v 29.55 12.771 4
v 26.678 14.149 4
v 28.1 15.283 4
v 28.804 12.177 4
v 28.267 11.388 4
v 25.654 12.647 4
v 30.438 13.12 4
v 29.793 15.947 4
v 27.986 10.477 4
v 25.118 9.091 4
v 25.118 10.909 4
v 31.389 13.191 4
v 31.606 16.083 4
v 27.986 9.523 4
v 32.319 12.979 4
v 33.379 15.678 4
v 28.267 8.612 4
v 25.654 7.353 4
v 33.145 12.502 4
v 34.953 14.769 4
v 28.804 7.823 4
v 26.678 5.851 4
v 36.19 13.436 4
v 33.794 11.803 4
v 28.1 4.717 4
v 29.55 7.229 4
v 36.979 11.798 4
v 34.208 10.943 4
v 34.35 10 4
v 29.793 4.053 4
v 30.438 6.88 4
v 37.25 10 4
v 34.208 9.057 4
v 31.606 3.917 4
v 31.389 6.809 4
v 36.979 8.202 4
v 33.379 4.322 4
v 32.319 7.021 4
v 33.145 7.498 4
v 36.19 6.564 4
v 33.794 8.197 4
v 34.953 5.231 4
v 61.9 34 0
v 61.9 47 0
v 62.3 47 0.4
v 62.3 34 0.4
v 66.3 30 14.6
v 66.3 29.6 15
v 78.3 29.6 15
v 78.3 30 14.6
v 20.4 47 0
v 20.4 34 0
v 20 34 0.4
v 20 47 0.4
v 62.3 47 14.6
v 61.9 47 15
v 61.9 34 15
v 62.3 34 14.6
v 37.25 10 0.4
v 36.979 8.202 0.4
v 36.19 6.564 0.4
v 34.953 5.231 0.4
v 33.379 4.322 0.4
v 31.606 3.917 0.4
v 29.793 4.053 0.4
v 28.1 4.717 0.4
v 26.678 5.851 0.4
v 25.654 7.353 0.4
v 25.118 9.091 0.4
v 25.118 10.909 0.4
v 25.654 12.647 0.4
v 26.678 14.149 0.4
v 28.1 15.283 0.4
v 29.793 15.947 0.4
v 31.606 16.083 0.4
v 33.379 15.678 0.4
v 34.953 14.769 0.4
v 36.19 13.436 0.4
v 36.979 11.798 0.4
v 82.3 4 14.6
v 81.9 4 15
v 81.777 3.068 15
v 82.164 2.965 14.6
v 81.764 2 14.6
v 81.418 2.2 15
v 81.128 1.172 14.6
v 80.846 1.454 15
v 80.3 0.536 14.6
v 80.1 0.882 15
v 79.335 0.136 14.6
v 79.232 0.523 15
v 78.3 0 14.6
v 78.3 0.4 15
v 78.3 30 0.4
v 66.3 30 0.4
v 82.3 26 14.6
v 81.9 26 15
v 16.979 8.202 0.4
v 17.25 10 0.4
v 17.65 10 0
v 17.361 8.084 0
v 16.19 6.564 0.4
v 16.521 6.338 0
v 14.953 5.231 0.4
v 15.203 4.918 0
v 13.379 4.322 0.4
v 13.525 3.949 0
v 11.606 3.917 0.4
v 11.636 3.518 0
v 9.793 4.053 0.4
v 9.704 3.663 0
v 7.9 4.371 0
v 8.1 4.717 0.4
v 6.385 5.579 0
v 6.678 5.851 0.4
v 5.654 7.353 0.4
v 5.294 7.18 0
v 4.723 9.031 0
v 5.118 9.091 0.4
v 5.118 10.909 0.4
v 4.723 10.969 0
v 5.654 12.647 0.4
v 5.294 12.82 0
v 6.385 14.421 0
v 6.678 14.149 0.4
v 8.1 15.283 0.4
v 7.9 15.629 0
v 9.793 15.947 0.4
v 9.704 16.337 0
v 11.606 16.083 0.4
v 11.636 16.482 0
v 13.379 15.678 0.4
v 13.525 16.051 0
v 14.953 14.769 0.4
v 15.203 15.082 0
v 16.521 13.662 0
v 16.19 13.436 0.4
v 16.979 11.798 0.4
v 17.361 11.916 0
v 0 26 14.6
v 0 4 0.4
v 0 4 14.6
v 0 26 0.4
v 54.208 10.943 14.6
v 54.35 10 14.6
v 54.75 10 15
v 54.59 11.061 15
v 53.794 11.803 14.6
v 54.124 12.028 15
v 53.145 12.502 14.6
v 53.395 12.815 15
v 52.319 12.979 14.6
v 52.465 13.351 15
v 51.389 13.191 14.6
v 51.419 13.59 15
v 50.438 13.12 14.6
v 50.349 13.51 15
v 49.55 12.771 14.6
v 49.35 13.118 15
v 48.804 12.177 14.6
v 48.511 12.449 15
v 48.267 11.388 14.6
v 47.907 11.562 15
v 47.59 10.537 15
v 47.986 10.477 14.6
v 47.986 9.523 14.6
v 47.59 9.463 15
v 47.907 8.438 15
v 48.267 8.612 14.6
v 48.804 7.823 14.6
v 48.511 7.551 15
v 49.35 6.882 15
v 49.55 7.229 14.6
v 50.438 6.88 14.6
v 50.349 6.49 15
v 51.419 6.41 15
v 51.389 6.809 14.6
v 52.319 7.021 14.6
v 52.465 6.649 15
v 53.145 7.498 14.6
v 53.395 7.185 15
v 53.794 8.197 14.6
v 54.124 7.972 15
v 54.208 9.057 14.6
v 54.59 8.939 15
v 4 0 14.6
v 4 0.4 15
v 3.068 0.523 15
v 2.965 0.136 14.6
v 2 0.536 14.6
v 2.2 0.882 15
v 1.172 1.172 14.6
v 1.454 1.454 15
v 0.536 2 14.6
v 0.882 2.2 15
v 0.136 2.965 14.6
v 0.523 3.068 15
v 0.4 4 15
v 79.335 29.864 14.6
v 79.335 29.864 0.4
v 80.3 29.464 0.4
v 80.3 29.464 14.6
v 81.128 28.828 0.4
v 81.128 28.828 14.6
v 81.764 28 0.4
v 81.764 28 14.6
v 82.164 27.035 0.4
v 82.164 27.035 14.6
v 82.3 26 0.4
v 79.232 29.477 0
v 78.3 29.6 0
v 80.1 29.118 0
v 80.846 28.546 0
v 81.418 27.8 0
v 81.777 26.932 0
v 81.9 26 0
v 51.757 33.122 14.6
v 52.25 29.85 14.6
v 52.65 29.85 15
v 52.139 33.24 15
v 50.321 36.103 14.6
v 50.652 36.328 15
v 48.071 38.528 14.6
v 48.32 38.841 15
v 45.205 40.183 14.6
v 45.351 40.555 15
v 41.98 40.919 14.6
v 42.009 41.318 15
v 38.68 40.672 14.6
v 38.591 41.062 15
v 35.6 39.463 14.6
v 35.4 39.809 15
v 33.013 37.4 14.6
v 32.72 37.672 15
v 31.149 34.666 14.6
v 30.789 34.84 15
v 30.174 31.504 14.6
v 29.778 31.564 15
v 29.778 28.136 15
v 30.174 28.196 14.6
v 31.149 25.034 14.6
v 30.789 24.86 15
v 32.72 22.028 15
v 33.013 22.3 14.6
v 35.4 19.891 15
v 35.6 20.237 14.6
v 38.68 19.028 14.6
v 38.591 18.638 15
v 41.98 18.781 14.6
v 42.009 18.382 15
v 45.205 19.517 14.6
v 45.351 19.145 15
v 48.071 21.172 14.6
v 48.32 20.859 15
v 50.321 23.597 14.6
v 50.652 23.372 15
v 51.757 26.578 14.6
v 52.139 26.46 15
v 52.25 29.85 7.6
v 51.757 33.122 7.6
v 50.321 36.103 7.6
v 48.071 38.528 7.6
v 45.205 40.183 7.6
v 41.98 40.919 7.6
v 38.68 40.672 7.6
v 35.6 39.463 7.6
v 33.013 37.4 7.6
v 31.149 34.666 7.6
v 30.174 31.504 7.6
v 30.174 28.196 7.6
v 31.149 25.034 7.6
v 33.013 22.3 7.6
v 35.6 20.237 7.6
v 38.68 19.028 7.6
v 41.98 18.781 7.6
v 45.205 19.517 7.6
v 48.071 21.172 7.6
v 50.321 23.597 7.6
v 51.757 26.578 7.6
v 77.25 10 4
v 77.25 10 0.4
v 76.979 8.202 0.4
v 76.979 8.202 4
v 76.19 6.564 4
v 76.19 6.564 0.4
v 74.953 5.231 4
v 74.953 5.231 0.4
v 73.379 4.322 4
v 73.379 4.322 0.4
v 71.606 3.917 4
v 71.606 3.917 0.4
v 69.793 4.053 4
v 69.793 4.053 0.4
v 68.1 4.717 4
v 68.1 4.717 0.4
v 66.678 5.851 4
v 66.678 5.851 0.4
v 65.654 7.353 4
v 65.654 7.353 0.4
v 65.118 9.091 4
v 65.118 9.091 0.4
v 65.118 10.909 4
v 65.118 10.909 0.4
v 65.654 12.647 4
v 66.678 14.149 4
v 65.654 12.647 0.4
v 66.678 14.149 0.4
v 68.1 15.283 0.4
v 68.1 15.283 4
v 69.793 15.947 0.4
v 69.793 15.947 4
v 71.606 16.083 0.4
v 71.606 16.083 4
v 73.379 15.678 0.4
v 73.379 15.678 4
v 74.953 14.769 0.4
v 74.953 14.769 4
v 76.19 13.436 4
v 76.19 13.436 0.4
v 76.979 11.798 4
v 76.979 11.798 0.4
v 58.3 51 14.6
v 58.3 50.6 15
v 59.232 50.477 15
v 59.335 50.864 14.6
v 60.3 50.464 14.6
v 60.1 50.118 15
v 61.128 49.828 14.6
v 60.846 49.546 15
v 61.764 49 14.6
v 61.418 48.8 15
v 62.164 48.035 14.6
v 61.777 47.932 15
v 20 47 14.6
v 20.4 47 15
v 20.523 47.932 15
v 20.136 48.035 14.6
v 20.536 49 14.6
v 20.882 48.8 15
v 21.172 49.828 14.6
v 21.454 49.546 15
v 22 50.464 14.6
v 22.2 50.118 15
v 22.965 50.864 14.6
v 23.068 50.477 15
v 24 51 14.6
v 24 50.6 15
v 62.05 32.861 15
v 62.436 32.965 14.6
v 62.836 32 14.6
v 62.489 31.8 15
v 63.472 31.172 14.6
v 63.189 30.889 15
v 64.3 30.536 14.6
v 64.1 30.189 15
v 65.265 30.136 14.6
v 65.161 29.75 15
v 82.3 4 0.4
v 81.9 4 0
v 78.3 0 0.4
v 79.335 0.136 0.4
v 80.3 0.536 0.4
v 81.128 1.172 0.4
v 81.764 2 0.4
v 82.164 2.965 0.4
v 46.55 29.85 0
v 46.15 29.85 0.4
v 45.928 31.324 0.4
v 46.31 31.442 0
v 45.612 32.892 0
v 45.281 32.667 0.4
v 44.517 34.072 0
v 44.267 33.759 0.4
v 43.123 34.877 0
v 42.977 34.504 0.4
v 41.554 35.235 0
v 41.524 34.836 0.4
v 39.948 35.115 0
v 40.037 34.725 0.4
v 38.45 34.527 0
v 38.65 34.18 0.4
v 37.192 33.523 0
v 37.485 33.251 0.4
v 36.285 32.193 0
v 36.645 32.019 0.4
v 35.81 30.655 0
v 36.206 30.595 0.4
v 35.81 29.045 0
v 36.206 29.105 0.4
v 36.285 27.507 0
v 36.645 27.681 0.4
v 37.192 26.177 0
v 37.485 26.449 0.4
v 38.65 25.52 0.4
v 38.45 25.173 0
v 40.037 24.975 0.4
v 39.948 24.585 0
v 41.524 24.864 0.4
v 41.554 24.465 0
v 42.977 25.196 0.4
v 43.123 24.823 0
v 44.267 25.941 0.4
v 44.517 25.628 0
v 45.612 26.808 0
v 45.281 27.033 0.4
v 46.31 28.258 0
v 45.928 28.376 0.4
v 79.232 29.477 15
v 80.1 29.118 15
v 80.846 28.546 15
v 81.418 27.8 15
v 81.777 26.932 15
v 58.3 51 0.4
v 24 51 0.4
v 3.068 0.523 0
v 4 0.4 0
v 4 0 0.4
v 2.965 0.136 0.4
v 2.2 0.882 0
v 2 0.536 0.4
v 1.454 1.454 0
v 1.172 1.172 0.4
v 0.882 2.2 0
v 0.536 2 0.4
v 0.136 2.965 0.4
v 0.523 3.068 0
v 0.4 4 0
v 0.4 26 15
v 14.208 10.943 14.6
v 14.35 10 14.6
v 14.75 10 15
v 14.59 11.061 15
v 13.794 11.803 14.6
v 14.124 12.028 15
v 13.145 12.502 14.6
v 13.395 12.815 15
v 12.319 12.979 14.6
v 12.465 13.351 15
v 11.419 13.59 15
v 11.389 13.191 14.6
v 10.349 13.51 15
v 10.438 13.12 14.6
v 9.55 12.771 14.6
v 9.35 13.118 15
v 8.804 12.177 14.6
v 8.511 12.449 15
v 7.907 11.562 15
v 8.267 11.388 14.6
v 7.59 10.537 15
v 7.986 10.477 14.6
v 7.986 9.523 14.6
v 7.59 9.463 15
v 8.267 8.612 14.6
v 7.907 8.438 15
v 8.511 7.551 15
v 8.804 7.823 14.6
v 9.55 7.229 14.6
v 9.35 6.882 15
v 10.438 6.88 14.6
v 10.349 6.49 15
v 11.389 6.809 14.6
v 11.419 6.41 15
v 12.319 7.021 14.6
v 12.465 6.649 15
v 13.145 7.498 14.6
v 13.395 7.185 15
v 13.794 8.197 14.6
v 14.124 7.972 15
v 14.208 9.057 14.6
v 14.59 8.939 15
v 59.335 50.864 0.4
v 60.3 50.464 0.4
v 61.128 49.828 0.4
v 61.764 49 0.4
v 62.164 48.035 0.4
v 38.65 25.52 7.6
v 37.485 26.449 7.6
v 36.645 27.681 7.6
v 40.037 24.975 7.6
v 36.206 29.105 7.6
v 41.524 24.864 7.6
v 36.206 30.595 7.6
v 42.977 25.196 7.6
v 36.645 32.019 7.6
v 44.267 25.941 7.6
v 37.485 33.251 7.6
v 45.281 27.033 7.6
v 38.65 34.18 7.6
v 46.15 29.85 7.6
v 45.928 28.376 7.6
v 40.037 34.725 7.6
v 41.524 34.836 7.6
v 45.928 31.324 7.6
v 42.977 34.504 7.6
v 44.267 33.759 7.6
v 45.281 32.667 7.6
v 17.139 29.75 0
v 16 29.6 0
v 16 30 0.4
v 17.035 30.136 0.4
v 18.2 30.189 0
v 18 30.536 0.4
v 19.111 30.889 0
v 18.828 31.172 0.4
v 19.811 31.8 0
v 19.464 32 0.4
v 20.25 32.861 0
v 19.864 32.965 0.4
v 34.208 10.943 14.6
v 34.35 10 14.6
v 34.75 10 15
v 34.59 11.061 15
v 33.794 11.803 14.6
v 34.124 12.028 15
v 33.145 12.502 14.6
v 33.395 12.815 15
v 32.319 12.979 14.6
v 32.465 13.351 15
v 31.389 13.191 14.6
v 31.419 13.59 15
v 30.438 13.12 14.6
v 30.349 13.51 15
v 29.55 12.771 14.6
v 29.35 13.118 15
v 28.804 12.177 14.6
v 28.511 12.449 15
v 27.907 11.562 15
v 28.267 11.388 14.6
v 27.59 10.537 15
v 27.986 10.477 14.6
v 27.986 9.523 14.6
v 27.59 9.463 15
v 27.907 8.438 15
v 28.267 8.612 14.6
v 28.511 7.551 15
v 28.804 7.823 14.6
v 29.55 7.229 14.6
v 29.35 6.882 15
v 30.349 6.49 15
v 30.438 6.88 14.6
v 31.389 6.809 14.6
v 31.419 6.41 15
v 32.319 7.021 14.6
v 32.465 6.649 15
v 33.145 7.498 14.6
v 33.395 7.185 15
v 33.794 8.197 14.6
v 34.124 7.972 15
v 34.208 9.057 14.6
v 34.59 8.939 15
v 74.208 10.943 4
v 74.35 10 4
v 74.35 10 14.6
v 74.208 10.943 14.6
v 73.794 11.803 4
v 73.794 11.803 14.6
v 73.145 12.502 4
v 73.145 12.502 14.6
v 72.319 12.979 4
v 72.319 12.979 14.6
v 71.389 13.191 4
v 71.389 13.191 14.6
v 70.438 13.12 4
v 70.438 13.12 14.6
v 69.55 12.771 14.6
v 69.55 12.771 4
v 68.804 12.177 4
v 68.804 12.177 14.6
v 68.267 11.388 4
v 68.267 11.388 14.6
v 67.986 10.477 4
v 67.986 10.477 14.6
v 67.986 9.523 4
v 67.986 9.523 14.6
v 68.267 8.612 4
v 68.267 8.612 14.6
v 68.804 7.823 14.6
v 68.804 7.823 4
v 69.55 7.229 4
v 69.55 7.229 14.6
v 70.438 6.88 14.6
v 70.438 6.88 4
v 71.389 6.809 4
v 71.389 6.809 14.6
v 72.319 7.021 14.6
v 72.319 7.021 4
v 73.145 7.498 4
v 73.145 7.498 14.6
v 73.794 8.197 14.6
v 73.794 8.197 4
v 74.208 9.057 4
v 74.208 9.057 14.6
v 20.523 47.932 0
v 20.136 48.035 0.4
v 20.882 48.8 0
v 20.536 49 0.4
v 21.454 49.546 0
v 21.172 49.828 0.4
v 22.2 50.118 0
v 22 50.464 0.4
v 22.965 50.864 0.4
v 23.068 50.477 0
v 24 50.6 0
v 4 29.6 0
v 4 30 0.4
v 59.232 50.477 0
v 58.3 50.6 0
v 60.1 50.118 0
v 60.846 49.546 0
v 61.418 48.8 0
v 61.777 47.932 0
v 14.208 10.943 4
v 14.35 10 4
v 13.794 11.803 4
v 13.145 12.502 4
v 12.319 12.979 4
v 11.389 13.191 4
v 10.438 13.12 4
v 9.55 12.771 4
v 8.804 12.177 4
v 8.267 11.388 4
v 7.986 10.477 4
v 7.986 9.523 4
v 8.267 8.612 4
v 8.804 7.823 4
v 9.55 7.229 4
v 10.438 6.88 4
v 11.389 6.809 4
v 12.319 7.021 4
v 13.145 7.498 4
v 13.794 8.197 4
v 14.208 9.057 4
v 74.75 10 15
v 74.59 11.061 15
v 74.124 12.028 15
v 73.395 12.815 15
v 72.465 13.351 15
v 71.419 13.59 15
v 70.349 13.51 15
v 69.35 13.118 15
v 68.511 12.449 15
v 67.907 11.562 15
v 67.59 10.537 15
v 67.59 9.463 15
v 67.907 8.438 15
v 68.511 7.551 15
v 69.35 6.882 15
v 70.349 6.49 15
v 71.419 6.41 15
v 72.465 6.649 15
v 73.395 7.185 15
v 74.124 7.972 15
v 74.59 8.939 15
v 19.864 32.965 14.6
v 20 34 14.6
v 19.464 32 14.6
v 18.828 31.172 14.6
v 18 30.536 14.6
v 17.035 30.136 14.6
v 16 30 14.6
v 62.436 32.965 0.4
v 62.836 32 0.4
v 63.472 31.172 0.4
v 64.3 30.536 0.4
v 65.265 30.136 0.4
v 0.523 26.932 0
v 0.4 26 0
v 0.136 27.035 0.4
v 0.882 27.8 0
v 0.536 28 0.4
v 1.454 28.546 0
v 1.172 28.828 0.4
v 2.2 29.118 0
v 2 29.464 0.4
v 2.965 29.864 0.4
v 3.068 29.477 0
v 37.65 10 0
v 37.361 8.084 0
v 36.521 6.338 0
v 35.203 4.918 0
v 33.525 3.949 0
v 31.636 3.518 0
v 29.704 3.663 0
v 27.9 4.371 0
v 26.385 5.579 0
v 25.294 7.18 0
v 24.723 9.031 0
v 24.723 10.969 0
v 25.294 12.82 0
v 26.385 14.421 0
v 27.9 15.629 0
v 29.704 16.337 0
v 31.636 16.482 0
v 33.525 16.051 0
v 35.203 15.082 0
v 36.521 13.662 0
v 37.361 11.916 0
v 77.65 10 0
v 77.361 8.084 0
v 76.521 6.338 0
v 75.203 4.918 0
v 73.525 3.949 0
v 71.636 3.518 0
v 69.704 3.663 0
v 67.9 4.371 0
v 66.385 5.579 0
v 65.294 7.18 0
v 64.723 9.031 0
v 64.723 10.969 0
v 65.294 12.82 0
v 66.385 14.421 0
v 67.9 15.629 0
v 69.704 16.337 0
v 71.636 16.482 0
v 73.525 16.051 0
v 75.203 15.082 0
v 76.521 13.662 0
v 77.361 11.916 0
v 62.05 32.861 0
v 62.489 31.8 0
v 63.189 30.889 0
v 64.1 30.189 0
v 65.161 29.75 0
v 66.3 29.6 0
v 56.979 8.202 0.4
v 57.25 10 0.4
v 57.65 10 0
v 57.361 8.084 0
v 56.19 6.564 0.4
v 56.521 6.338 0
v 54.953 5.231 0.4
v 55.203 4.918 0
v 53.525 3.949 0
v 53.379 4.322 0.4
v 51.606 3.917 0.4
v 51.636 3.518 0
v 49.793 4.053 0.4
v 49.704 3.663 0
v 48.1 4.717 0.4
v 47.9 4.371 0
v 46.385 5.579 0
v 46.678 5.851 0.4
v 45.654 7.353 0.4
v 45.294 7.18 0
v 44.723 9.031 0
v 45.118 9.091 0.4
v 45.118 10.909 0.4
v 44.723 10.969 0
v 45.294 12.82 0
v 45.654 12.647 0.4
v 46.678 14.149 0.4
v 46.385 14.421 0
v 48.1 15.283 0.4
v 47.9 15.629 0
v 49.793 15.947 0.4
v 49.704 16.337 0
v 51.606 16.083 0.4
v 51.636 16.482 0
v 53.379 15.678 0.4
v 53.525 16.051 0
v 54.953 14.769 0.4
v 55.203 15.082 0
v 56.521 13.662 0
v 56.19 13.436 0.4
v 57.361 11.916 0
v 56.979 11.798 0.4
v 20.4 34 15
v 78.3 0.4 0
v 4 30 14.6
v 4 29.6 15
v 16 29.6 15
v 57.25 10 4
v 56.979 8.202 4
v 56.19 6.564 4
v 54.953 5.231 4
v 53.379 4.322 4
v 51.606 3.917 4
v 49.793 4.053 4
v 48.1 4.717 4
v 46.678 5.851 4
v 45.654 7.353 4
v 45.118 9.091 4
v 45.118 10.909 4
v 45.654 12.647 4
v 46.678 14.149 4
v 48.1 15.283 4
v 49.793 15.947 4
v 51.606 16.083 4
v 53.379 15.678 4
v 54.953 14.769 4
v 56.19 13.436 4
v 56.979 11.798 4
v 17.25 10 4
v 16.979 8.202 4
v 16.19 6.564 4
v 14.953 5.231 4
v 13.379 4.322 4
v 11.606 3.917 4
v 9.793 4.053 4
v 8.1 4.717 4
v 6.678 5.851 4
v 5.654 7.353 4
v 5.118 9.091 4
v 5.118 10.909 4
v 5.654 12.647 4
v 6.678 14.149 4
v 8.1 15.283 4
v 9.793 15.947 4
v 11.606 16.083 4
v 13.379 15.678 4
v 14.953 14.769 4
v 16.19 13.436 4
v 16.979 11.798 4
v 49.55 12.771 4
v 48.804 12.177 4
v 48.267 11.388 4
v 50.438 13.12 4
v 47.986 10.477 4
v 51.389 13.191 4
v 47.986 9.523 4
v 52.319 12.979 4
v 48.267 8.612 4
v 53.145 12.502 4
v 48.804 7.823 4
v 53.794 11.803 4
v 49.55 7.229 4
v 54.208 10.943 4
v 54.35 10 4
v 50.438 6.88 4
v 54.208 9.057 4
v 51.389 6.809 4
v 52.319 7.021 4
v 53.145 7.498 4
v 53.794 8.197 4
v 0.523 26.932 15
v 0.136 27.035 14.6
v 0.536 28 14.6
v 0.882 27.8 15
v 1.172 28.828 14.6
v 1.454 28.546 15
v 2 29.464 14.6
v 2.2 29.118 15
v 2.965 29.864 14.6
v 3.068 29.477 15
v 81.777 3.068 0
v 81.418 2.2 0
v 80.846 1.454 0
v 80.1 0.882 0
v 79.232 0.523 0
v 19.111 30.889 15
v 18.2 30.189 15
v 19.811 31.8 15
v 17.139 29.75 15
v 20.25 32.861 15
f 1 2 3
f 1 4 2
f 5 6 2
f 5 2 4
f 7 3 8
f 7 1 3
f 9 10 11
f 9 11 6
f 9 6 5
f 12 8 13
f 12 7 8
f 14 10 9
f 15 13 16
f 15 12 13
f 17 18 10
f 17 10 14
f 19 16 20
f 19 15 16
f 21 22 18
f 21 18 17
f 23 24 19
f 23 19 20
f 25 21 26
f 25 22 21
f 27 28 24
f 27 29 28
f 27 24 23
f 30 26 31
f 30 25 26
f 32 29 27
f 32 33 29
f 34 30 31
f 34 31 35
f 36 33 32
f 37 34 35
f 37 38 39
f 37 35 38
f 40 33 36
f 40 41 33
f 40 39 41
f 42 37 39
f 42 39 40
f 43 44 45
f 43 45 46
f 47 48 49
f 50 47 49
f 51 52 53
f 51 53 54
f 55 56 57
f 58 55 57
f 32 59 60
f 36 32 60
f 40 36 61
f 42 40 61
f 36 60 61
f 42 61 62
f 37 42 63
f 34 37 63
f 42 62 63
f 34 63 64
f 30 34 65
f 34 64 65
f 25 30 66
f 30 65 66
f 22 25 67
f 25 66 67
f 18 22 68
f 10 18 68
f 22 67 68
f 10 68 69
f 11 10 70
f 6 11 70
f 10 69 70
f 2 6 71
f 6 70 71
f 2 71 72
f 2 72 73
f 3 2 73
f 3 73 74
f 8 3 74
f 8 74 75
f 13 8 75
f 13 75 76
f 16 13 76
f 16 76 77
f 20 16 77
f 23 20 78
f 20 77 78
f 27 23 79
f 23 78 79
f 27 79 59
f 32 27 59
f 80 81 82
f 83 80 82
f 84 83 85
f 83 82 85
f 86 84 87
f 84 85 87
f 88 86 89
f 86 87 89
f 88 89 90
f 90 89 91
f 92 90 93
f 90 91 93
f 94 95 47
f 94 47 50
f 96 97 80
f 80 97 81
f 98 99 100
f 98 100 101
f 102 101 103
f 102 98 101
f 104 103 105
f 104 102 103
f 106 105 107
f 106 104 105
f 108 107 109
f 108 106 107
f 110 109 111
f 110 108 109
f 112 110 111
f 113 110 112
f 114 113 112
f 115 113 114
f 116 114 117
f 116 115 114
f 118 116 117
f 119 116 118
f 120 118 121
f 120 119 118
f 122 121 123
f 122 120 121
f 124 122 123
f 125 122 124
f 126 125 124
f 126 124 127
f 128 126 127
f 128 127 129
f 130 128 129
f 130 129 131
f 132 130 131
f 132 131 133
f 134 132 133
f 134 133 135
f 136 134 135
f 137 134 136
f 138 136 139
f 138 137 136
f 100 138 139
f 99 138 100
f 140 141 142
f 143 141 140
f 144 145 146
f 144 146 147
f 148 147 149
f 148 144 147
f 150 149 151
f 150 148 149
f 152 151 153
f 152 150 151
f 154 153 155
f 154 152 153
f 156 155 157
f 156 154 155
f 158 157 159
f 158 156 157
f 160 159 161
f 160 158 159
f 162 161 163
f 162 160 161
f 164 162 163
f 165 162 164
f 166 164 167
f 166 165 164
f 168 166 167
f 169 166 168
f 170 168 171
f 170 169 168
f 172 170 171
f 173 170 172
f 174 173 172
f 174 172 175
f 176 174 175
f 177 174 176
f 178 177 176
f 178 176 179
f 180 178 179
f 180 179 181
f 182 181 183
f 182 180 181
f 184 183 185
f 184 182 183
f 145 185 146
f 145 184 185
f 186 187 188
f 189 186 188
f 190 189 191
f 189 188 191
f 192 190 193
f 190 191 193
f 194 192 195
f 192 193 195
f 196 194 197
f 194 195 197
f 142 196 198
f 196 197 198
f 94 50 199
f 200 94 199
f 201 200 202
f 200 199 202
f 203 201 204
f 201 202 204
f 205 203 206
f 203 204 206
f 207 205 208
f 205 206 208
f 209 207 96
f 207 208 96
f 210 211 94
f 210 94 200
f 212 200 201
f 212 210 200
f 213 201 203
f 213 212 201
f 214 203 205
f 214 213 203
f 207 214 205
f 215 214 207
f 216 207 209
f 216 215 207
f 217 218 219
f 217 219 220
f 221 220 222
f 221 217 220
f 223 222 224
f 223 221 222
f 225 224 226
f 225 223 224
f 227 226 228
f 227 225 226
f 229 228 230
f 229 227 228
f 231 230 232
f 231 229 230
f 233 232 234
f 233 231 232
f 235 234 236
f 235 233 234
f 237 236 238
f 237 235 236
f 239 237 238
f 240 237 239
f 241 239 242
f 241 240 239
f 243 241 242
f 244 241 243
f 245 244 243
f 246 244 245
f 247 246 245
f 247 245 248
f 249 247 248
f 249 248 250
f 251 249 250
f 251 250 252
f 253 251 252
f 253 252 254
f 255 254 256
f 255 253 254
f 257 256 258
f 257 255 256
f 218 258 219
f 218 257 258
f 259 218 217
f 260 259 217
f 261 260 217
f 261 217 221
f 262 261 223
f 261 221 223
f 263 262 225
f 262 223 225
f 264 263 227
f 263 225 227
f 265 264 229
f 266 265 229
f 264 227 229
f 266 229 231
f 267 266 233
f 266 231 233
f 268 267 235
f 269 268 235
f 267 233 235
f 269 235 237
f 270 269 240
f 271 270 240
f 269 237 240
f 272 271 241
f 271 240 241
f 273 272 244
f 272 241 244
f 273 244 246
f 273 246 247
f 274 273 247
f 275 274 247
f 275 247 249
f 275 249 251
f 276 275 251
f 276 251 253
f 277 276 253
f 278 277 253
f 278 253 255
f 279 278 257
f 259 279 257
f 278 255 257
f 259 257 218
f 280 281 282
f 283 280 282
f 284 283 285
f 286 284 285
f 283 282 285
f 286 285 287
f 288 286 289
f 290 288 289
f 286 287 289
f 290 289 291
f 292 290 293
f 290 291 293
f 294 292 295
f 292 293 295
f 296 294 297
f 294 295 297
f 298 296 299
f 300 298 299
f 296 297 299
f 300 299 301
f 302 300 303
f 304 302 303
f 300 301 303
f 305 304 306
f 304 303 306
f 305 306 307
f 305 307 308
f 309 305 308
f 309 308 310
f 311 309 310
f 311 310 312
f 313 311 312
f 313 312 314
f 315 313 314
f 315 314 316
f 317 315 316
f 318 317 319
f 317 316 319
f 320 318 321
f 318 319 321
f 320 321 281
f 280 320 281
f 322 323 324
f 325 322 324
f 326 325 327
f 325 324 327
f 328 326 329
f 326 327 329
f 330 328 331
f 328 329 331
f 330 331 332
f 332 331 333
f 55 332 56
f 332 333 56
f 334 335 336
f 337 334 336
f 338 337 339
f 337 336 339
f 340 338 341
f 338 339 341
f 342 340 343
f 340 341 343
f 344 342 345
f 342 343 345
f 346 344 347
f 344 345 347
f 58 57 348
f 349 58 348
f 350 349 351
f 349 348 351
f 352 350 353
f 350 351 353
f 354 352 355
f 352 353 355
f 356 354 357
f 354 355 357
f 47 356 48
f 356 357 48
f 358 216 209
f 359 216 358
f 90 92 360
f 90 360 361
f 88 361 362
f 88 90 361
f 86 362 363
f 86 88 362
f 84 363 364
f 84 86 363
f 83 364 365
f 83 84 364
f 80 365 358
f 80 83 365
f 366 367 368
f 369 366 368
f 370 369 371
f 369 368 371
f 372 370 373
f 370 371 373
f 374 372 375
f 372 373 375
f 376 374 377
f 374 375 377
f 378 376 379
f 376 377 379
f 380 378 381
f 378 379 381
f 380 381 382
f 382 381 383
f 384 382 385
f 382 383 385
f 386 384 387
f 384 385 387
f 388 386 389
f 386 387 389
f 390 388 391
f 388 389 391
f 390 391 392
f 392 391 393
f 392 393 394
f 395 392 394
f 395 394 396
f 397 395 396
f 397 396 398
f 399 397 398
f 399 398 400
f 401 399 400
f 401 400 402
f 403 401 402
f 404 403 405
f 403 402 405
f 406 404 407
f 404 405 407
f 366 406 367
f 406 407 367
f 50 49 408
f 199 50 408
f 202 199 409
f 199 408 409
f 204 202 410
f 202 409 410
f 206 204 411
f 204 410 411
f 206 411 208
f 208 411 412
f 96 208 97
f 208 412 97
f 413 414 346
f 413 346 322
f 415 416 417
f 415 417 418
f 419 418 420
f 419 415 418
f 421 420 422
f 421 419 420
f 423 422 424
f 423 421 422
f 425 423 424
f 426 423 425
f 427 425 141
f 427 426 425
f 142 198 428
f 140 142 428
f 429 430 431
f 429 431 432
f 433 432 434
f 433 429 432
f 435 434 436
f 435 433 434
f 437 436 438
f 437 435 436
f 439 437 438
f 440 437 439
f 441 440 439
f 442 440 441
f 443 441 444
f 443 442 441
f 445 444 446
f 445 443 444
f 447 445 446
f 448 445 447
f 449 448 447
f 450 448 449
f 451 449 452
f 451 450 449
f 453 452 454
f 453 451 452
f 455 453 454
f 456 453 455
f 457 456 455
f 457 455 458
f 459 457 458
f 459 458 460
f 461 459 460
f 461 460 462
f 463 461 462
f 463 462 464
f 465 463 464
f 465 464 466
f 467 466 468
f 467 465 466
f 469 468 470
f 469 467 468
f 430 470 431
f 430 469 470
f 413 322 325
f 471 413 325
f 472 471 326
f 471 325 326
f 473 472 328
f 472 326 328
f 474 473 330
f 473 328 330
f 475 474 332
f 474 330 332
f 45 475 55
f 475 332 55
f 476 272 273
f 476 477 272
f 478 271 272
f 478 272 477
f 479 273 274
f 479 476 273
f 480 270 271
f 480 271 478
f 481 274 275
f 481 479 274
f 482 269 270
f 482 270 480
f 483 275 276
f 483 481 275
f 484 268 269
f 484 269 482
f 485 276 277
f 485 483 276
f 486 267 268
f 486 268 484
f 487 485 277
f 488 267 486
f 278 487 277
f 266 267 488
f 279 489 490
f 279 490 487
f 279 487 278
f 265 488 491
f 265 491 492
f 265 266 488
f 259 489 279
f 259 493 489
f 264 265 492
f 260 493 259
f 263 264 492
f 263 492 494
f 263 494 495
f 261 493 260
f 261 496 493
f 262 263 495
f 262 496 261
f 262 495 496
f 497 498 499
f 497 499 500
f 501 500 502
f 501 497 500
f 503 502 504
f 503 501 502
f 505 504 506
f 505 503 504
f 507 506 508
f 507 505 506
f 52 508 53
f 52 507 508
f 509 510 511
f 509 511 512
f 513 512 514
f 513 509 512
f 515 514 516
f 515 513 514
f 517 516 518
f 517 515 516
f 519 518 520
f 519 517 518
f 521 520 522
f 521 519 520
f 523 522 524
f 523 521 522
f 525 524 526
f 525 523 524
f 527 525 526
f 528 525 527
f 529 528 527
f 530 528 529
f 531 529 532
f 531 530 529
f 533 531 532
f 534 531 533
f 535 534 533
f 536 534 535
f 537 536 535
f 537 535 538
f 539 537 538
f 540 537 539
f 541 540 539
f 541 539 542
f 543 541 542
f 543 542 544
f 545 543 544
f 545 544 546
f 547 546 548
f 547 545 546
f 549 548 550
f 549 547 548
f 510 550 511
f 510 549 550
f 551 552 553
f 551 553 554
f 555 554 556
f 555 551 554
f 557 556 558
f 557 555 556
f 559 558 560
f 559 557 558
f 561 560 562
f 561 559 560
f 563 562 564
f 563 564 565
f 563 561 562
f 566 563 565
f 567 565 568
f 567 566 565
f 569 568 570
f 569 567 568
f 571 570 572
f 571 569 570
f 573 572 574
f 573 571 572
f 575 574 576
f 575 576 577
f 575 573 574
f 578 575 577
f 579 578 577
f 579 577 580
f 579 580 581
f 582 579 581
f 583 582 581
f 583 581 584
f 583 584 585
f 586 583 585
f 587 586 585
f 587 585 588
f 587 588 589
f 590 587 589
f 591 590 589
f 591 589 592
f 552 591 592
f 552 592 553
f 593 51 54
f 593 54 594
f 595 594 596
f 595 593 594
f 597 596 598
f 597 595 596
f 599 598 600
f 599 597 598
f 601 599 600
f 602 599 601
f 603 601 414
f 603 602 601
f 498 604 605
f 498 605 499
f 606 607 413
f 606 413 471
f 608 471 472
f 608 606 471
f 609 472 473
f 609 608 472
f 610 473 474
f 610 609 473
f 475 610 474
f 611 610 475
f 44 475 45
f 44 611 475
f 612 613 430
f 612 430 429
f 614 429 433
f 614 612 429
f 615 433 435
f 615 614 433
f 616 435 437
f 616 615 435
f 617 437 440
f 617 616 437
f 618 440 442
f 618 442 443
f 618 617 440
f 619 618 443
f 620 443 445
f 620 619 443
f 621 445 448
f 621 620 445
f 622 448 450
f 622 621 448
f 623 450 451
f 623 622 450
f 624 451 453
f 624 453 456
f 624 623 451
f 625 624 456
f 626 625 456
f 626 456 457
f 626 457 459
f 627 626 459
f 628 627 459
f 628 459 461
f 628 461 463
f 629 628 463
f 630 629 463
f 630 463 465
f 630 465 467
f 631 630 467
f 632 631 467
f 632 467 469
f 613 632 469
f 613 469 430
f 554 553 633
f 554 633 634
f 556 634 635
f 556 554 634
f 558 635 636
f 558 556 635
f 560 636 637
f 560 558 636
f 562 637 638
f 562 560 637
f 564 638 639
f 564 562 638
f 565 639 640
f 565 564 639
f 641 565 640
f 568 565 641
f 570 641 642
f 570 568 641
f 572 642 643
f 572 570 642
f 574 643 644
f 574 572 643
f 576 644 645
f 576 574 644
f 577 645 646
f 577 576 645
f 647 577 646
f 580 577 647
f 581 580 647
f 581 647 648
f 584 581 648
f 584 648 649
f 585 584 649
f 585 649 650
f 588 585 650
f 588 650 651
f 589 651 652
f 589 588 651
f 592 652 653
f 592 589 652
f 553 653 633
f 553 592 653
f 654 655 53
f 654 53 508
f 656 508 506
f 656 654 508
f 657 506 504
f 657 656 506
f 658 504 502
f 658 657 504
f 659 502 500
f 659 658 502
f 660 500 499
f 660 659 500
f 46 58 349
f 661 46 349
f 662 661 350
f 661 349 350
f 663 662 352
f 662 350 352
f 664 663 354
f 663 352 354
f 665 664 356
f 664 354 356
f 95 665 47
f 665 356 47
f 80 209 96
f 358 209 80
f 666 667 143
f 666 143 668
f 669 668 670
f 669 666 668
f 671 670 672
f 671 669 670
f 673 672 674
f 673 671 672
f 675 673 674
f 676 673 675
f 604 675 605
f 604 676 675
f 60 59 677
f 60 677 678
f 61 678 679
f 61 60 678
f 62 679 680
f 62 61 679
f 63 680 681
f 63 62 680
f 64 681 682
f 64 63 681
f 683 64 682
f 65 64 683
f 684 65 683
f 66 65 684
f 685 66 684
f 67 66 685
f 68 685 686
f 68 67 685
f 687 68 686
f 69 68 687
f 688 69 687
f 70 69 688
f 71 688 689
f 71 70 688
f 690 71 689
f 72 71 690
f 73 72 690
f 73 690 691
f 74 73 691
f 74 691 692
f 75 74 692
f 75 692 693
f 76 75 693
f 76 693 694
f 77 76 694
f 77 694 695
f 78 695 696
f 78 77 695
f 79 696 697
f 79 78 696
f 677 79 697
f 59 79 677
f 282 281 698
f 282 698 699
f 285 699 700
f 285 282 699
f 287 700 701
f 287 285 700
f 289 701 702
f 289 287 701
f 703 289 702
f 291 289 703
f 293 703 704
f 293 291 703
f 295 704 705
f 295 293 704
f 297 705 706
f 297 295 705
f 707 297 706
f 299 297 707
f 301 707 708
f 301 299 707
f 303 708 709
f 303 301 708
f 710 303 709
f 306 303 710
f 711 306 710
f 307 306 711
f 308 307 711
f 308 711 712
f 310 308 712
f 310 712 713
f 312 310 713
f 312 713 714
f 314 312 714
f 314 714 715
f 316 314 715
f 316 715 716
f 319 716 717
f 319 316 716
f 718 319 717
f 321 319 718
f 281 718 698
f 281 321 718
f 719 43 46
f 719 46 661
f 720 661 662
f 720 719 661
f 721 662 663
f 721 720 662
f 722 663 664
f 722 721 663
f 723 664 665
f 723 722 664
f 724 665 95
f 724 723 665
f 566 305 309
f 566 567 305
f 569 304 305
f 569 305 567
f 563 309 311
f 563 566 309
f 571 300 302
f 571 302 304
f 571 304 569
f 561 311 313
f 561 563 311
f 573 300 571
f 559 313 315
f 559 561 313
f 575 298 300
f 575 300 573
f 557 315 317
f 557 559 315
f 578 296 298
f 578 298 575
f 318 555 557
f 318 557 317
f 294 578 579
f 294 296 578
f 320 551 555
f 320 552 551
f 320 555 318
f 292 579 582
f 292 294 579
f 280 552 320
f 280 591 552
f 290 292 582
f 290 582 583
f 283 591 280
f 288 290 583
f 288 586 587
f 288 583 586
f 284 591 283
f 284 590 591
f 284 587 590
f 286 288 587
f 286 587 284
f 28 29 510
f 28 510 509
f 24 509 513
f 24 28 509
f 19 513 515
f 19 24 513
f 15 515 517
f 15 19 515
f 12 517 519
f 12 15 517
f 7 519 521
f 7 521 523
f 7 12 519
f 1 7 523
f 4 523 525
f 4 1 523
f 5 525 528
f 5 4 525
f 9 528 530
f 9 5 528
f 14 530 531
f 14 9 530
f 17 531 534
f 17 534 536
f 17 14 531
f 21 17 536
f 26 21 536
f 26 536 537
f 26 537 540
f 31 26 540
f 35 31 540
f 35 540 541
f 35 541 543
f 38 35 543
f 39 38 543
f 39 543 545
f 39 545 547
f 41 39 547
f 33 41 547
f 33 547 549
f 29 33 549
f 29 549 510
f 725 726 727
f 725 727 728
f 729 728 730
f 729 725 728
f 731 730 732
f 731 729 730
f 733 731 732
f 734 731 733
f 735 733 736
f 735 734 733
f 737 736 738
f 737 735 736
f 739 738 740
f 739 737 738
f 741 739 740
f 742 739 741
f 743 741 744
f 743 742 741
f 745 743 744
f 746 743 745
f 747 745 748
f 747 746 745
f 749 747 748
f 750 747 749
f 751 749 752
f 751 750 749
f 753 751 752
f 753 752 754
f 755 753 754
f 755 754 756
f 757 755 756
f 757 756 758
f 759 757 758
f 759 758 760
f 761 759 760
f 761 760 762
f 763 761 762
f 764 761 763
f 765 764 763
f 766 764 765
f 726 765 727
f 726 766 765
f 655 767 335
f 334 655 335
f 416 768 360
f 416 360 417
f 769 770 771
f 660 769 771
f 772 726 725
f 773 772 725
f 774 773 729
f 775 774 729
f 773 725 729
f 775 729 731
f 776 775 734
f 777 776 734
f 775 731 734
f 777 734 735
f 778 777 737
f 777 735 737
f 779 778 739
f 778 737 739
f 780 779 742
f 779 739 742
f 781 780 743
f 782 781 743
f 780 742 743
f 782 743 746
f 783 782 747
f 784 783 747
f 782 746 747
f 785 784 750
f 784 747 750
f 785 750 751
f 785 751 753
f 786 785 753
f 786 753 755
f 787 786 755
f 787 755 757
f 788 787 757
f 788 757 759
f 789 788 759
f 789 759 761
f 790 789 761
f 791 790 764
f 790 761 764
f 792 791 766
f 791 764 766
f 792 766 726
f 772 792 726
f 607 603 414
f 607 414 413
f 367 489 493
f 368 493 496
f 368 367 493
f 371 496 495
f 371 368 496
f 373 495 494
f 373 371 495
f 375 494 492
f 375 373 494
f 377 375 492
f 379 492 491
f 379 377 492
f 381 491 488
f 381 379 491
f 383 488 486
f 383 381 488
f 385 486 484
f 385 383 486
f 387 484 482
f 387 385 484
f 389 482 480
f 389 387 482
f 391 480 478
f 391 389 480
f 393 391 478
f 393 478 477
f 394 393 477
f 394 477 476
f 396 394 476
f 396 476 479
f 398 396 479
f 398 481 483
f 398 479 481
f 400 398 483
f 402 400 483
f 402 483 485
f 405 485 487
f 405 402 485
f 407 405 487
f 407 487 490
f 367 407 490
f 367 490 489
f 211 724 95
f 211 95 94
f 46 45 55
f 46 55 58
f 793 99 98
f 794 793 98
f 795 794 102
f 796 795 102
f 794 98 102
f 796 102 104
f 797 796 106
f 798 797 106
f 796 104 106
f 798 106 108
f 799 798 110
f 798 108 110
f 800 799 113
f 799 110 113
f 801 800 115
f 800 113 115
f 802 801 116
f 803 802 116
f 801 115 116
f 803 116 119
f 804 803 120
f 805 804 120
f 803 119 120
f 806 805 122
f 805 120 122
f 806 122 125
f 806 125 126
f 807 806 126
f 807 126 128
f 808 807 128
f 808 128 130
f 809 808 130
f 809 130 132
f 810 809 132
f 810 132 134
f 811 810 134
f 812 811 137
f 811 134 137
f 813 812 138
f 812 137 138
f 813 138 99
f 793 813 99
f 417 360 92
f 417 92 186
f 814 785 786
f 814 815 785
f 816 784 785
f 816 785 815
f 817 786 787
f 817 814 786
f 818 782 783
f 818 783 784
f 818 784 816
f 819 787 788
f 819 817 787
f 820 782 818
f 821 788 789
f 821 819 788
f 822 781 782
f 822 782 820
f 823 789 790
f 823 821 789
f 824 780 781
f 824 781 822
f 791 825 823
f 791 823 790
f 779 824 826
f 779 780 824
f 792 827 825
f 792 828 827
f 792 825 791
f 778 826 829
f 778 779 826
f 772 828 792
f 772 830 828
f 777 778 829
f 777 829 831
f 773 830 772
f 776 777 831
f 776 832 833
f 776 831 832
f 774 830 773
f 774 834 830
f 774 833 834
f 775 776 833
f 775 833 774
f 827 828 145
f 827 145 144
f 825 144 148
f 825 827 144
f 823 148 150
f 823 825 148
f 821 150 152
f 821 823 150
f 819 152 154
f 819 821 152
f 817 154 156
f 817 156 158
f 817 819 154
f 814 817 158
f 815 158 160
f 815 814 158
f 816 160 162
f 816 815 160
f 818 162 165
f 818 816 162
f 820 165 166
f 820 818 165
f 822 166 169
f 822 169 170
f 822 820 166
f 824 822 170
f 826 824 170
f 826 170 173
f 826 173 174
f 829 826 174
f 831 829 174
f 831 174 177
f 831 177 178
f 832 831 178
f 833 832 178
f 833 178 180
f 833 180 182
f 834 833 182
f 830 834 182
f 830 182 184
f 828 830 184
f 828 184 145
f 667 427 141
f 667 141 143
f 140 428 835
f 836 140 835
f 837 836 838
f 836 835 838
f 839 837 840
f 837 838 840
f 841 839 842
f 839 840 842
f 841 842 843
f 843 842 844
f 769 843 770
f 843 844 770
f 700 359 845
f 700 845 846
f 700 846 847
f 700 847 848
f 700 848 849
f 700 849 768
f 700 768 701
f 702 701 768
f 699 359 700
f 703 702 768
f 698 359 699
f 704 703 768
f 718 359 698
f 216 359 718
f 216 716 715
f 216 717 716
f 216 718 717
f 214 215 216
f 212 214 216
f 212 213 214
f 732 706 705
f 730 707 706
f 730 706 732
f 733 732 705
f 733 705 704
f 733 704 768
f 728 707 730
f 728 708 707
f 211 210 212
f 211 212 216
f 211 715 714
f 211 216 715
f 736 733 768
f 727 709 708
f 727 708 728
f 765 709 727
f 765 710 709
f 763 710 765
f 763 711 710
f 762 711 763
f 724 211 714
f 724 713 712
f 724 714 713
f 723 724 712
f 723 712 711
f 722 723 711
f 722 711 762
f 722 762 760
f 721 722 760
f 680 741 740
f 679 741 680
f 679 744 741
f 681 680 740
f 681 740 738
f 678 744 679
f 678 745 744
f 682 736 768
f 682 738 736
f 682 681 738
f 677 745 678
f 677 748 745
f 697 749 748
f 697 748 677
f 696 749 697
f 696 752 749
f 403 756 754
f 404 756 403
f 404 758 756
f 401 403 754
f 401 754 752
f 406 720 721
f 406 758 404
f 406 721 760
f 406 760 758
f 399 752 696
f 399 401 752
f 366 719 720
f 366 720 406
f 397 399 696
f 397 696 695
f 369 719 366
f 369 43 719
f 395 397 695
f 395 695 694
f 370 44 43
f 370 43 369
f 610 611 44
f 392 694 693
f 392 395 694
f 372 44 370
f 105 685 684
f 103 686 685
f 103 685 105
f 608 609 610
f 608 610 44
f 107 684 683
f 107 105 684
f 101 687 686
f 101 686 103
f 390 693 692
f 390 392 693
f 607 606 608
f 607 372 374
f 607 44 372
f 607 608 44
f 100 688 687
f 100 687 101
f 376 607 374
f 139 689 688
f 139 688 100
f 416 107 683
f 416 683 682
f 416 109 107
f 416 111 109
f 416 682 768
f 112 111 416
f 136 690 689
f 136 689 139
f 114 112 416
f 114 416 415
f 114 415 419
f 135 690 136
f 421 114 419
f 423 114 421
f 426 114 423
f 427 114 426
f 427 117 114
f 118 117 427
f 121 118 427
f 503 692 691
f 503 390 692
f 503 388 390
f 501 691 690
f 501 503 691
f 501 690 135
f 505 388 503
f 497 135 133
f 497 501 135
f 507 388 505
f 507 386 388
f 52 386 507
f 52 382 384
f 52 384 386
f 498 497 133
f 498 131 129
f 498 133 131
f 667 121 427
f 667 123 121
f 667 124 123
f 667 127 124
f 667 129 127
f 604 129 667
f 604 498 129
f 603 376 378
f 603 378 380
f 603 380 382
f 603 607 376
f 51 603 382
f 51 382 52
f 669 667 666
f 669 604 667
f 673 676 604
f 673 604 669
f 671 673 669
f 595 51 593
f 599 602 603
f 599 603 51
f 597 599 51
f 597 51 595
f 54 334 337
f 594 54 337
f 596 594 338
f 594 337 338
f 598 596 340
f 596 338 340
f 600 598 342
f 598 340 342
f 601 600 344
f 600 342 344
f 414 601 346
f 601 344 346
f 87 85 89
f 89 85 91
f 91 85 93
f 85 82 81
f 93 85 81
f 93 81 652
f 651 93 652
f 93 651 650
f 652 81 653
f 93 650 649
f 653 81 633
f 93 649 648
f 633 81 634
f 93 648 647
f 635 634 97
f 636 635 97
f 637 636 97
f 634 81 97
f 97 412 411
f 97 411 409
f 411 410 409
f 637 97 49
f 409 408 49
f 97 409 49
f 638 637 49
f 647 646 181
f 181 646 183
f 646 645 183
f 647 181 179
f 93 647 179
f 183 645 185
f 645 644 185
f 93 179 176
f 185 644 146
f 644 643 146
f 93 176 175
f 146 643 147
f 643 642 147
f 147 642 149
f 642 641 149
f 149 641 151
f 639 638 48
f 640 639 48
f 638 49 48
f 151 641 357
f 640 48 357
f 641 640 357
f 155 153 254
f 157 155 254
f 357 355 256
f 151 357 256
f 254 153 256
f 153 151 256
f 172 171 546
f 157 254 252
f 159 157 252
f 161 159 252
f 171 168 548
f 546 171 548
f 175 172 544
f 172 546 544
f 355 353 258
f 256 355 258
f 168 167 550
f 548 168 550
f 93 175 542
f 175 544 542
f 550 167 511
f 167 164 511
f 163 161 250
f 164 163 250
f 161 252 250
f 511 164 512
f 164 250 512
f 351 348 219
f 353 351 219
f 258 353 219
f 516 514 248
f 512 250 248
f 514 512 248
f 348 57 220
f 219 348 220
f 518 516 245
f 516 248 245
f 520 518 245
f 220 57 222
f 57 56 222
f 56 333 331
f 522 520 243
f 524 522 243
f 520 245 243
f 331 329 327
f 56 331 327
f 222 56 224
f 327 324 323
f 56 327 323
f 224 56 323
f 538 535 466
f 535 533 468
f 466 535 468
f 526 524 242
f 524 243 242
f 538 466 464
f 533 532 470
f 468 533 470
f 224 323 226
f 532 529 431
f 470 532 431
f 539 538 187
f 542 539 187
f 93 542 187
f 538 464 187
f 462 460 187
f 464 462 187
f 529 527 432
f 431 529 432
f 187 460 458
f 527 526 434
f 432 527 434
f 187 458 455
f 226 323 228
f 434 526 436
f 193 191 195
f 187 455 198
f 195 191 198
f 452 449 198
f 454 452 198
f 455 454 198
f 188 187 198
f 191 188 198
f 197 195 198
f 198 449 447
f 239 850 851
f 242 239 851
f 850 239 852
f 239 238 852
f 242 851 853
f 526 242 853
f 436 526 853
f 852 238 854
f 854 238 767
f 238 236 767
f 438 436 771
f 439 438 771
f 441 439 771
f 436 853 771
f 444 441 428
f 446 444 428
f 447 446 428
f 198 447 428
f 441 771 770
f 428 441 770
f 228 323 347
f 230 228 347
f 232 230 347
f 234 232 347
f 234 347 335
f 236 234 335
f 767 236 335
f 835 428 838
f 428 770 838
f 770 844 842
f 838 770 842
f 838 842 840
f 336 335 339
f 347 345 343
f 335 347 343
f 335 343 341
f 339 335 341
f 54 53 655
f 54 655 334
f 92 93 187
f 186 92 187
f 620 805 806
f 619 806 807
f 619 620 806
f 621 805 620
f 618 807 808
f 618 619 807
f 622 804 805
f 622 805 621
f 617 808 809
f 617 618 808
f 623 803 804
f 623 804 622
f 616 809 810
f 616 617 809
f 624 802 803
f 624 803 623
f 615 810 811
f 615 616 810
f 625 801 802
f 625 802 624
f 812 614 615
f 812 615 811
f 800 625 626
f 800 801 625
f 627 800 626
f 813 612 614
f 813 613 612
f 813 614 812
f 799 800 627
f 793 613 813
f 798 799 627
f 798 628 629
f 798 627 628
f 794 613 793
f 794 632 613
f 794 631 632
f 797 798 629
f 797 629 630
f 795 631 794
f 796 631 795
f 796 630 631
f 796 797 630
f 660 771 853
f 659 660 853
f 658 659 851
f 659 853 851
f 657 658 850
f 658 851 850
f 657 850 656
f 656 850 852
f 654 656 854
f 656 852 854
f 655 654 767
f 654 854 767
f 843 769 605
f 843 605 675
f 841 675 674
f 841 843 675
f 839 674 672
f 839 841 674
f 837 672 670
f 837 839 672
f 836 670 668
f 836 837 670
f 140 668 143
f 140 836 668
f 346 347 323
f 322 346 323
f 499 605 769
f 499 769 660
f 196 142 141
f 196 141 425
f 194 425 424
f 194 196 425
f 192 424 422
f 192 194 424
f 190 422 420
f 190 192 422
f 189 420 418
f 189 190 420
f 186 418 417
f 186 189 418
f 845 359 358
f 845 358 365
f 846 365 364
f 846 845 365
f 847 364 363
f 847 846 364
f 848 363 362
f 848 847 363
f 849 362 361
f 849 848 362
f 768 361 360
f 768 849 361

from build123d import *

# Parameters (mm, degrees)
SKETCH_R        = 5
SKETCH_R_2      = 3.2
PAD_DEPTH       = 15
SKETCH002_R     = 6.1
POCKET001_DEPTH = 4
SKETCH003_R     = 11.1
POCKET_DEPTH    = 7.4
FILLET_R        = 4
CHAMFER_SIZE    = 0.4
CHAMFER001_SIZE = 0.4


with BuildPart() as part:
    # Sketch → Pad (new body)
    with BuildSketch(Plane.XY):
        Polygon((20, 30), (20, 51), (62.3, 51), (62.3, 30), (82.3, 30), (82.3, 0), (0, 0), (0, 30), align=None)
        with Locations((41.15, 29.85)):
            Circle(SKETCH_R, mode=Mode.SUBTRACT)
        with Locations((11.15, 10)):
            Circle(SKETCH_R_2, mode=Mode.SUBTRACT)
        with Locations((31.15, 10)):
            Circle(SKETCH_R_2, mode=Mode.SUBTRACT)
        with Locations((51.15, 10)):
            Circle(SKETCH_R_2, mode=Mode.SUBTRACT)
        with Locations((71.15, 10)):
            Circle(SKETCH_R_2, mode=Mode.SUBTRACT)
    extrude(amount=PAD_DEPTH)

    # Sketch002 → Pocket001 (cut)
    with BuildSketch(Plane(origin=(0, 0, 0), x_dir=(1, 0, 0), z_dir=(0, 0, -1))):
        with Locations((11.15, -10)):
            Circle(SKETCH002_R)
        with Locations((31.15, -10)):
            Circle(SKETCH002_R)
        with Locations((51.15, -10)):
            Circle(SKETCH002_R)
        with Locations((71.15, -10)):
            Circle(SKETCH002_R)
    extrude(amount=-POCKET001_DEPTH, mode=Mode.SUBTRACT)

    # Sketch003 (on Face5 of Pocket001) → Pocket (cut)
    with BuildSketch(Plane.XY.offset(15)):
        with Locations((41.15, 29.85)):
            Circle(SKETCH003_R)
    extrude(amount=-POCKET_DEPTH, mode=Mode.SUBTRACT)

    # Fillet
    fillet_edges = [part.edges().sort_by_distance(p)[0] for p in [
        (82.3, 0, 7.5),
        (0, 0, 7.5),
        (0, 30, 7.5),
        (20, 30, 7.5),
        (20, 51, 7.5),
        (62.3, 51, 7.5),
        (62.3, 30, 7.5),
        (82.3, 30, 7.5),
    ]]
    fillet(fillet_edges, radius=FILLET_R)

    # Chamfer
    chamfer_edges = [part.edges().sort_by_distance(p)[0] for p in [
        (20, 40.5, 0),
        (18.828427, 31.171573, 0),
        (21.171573, 49.828427, 0),
        (10, 30, 0),
        (41.15, 51, 0),
        (1.171573, 28.828427, 0),
        (61.128427, 49.828427, 0),
        (0, 15, 0),
        (62.3, 40.5, 0),
        (1.171573, 1.171573, 0),
        (63.471573, 31.171573, 0),
        (41.15, 0, 0),
        (72.3, 30, 0),
        (81.128427, 1.171573, 0),
        (81.128427, 28.828427, 0),
        (82.3, 15, 0),
        (65.05, 10, 0),
        (45.05, 10, 0),
        (25.05, 10, 0),
        (5.05, 10, 0),
        (36.15, 29.85, 0),
    ]]
    chamfer(chamfer_edges, length=CHAMFER_SIZE)

    # Chamfer001
    chamfer001_edges = [part.edges().sort_by_distance(p)[0] for p in [
        (20, 40.5, 15),
        (18.828427, 31.171573, 15),
        (21.171573, 49.828427, 15),
        (10, 30, 15),
        (41.15, 51, 15),
        (1.171573, 28.828427, 15),
        (61.128427, 49.828427, 15),
        (0, 15, 15),
        (62.3, 40.5, 15),
        (1.171573, 1.171573, 15),
        (63.471573, 31.171573, 15),
        (41.15, 0, 15),
        (72.3, 30, 15),
        (81.128427, 1.171573, 15),
        (81.128427, 28.828427, 15),
        (82.3, 15, 15),
        (67.95, 10, 15),
        (47.95, 10, 15),
        (27.95, 10, 15),
        (7.95, 10, 15),
        (30.05, 29.85, 15),
    ]]
    chamfer(chamfer001_edges, length=CHAMFER001_SIZE)


solid = part.part
